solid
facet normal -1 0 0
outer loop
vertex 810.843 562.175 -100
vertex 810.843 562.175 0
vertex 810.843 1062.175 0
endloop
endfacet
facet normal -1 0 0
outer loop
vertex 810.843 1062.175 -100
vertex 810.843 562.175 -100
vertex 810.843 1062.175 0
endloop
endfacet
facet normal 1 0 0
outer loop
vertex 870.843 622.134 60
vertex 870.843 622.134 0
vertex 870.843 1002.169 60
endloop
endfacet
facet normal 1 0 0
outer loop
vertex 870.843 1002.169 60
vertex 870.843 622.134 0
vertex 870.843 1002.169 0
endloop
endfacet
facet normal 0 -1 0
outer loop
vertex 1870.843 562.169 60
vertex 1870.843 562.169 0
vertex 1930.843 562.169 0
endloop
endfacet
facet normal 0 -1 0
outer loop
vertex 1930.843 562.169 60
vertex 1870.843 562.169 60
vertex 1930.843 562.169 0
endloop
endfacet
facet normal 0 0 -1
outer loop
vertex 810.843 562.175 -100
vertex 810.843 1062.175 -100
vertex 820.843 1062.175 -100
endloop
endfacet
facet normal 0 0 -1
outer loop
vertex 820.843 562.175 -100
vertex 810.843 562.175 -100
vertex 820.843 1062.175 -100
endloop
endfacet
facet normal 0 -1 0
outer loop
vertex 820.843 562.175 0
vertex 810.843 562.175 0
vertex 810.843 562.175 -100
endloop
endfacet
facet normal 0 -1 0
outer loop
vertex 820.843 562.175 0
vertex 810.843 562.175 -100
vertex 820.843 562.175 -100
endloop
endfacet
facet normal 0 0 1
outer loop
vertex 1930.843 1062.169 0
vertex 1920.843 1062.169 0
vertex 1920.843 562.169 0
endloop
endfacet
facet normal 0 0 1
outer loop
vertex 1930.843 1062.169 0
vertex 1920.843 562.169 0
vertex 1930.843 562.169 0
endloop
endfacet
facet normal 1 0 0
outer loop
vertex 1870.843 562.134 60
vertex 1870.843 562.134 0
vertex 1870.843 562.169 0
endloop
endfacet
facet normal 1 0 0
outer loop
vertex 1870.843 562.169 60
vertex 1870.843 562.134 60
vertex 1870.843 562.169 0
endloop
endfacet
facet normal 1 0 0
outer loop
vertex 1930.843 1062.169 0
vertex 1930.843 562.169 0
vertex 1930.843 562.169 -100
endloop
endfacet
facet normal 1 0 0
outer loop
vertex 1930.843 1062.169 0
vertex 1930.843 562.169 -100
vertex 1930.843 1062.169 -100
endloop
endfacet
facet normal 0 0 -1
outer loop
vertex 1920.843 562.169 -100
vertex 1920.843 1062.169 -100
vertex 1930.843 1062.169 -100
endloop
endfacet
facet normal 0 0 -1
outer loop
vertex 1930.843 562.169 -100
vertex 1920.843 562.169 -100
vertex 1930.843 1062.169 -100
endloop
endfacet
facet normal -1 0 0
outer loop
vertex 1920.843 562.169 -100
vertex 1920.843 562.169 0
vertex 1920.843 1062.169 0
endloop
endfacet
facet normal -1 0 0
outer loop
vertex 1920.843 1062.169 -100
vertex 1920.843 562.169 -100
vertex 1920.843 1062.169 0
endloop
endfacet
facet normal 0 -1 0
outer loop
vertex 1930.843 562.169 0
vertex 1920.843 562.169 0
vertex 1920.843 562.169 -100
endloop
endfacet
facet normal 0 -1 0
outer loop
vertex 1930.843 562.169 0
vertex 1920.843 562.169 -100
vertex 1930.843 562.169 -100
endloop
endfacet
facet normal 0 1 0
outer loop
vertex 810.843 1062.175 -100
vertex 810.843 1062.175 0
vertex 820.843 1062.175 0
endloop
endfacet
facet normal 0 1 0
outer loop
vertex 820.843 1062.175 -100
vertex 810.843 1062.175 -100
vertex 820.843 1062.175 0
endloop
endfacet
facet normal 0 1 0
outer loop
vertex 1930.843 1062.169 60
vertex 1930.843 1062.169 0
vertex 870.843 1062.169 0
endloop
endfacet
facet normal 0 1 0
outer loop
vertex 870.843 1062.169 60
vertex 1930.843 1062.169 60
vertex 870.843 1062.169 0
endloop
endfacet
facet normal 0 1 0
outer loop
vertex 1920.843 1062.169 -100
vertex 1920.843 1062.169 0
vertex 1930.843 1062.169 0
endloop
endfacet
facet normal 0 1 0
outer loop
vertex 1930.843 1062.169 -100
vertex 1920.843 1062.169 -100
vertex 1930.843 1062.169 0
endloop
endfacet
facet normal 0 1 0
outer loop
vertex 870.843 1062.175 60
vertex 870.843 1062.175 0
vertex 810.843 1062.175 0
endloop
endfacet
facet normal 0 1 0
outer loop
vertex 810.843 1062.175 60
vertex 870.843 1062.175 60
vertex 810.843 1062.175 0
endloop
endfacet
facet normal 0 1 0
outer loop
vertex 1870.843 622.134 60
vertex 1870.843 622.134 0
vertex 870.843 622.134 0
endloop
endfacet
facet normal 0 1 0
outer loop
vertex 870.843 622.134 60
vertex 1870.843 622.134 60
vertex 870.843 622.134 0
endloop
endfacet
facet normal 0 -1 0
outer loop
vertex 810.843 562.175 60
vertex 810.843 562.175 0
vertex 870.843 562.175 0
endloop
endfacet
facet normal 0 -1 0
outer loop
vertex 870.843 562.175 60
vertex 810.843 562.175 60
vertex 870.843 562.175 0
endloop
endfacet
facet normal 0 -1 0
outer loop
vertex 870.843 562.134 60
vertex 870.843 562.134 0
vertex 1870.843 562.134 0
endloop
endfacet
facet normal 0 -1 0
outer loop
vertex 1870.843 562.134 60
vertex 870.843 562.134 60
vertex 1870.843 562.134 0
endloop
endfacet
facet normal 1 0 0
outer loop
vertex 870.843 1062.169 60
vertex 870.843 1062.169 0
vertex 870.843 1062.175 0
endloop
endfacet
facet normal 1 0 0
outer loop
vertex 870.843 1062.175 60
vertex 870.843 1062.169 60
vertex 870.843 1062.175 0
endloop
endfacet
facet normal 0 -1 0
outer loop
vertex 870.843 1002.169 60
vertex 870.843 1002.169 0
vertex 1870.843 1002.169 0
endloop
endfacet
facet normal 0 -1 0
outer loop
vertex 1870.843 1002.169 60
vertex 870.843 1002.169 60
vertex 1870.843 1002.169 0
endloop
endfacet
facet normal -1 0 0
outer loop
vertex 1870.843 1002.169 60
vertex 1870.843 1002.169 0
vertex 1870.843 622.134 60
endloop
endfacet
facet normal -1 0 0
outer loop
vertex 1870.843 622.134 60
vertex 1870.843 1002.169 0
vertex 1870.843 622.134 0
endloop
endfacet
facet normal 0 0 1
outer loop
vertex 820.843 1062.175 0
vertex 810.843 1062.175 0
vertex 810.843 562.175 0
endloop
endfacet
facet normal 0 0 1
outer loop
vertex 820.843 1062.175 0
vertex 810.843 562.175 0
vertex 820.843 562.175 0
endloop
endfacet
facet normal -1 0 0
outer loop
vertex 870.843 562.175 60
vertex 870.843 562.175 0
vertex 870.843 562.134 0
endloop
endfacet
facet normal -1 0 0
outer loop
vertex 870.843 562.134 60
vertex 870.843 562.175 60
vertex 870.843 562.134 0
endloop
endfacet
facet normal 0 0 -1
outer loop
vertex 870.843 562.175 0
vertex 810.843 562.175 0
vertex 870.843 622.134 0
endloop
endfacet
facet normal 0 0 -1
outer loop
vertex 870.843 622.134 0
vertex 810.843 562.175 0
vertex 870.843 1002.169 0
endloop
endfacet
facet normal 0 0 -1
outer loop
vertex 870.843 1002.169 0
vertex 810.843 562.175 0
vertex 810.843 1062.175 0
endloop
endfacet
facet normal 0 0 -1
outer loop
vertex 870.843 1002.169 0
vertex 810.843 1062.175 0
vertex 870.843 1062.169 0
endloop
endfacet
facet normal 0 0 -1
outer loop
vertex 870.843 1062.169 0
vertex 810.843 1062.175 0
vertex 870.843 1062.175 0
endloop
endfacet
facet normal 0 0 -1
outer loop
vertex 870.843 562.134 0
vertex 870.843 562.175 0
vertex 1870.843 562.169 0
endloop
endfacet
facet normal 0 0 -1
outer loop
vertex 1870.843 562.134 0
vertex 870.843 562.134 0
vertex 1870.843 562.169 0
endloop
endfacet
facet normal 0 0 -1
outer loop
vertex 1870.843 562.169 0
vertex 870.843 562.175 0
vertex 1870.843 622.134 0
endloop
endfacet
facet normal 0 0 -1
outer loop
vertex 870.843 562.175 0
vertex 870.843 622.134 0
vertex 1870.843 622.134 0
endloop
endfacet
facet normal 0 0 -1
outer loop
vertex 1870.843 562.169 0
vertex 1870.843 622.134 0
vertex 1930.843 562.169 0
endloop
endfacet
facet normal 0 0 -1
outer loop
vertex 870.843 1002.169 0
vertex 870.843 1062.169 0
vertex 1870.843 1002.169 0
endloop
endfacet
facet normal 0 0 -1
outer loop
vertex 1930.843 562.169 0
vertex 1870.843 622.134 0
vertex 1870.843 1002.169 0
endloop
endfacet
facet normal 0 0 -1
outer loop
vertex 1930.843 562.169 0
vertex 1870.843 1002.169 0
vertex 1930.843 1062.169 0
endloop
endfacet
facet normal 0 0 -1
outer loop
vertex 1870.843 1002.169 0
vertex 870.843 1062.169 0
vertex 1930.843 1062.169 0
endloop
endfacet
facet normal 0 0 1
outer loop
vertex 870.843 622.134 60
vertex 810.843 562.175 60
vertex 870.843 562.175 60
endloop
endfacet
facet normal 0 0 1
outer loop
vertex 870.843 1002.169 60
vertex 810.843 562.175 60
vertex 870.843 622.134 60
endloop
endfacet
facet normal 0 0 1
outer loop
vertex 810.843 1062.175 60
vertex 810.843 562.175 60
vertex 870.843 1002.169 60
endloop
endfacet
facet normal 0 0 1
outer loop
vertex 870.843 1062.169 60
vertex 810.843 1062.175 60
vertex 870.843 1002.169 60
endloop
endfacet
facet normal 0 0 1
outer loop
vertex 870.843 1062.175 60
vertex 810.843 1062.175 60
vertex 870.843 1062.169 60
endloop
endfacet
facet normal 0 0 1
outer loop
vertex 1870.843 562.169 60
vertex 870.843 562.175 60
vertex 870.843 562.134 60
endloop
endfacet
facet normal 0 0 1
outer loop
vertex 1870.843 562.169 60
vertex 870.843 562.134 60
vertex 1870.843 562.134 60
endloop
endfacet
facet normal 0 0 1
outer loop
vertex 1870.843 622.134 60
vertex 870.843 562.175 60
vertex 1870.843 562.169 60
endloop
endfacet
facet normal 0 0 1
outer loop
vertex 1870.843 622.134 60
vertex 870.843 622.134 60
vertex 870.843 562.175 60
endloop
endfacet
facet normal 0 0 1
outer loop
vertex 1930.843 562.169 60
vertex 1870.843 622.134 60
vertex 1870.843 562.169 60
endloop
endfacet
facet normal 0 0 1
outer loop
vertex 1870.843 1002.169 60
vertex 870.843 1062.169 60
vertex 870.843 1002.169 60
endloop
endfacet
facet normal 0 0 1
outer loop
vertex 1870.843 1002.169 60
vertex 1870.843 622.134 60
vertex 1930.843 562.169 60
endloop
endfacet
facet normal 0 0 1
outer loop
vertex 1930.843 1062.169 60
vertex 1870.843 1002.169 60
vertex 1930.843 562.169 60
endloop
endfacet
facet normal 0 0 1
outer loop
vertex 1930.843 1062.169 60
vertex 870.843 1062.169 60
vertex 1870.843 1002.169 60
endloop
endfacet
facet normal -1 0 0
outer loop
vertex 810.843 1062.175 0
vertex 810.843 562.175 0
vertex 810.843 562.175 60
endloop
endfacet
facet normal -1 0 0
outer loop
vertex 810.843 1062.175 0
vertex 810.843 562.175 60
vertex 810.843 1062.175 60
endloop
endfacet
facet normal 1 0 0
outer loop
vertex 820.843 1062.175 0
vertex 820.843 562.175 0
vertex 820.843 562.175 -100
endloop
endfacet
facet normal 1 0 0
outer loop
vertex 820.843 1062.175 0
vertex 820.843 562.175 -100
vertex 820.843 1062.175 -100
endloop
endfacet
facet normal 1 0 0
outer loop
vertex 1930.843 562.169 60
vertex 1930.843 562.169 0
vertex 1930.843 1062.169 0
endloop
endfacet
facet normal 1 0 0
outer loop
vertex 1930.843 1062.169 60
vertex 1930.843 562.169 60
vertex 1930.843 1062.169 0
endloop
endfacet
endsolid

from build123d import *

# Parameters (mm, degrees)
F0_W     = 1000
F0_H     = 60
F0_W_2   = 10
F0_H_2   = 500
F1_DEPTH = 60
F2_DEPTH = 100


with BuildPart() as f1:
    # F0 (on Top) → F1 (new body)
    with BuildSketch(Plane.XY):
        Polygon((1870.842755, 622.134268), (870.842755, 622.134268), (870.842755, 562.175333), (870.842755, 562.134268), (1870.842755, 562.134268), (1870.842755, 562.169433), align=None)
        Polygon((870.842755, 562.175333), (870.842755, 622.134268), (870.842755, 1002.169433), (870.842755, 1062.169433), (870.842755, 1062.175333), (820.842755, 1062.175333), (820.842755, 562.175333), align=None)
        Polygon((1870.842755, 1002.169433), (1870.842755, 622.134268), (1870.842755, 562.169433), (1920.842755, 562.169433), (1920.842755, 1062.169433), (1870.842755, 1062.169433), align=None)
        with Locations((1370.842755, 1032.169433)):
            Rectangle(F0_W, F0_H)
        with Locations((815.842755, 812.175333)):
            Rectangle(F0_W_2, F0_H_2)
        with Locations((1925.842755, 812.169433)):
            Rectangle(F0_W_2, F0_H_2)
    extrude(amount=F1_DEPTH)


with BuildPart() as f2:
    # F0 (on Top) → F2 (new body)
    with BuildSketch(Plane.XY):
        with Locations((1925.842755, 812.169433)):
            Rectangle(F0_W_2, F0_H_2)
        with Locations((815.842755, 812.175333)):
            Rectangle(F0_W_2, F0_H_2)
    extrude(amount=-F2_DEPTH)


solid = Compound([f1.part, f2.part])
